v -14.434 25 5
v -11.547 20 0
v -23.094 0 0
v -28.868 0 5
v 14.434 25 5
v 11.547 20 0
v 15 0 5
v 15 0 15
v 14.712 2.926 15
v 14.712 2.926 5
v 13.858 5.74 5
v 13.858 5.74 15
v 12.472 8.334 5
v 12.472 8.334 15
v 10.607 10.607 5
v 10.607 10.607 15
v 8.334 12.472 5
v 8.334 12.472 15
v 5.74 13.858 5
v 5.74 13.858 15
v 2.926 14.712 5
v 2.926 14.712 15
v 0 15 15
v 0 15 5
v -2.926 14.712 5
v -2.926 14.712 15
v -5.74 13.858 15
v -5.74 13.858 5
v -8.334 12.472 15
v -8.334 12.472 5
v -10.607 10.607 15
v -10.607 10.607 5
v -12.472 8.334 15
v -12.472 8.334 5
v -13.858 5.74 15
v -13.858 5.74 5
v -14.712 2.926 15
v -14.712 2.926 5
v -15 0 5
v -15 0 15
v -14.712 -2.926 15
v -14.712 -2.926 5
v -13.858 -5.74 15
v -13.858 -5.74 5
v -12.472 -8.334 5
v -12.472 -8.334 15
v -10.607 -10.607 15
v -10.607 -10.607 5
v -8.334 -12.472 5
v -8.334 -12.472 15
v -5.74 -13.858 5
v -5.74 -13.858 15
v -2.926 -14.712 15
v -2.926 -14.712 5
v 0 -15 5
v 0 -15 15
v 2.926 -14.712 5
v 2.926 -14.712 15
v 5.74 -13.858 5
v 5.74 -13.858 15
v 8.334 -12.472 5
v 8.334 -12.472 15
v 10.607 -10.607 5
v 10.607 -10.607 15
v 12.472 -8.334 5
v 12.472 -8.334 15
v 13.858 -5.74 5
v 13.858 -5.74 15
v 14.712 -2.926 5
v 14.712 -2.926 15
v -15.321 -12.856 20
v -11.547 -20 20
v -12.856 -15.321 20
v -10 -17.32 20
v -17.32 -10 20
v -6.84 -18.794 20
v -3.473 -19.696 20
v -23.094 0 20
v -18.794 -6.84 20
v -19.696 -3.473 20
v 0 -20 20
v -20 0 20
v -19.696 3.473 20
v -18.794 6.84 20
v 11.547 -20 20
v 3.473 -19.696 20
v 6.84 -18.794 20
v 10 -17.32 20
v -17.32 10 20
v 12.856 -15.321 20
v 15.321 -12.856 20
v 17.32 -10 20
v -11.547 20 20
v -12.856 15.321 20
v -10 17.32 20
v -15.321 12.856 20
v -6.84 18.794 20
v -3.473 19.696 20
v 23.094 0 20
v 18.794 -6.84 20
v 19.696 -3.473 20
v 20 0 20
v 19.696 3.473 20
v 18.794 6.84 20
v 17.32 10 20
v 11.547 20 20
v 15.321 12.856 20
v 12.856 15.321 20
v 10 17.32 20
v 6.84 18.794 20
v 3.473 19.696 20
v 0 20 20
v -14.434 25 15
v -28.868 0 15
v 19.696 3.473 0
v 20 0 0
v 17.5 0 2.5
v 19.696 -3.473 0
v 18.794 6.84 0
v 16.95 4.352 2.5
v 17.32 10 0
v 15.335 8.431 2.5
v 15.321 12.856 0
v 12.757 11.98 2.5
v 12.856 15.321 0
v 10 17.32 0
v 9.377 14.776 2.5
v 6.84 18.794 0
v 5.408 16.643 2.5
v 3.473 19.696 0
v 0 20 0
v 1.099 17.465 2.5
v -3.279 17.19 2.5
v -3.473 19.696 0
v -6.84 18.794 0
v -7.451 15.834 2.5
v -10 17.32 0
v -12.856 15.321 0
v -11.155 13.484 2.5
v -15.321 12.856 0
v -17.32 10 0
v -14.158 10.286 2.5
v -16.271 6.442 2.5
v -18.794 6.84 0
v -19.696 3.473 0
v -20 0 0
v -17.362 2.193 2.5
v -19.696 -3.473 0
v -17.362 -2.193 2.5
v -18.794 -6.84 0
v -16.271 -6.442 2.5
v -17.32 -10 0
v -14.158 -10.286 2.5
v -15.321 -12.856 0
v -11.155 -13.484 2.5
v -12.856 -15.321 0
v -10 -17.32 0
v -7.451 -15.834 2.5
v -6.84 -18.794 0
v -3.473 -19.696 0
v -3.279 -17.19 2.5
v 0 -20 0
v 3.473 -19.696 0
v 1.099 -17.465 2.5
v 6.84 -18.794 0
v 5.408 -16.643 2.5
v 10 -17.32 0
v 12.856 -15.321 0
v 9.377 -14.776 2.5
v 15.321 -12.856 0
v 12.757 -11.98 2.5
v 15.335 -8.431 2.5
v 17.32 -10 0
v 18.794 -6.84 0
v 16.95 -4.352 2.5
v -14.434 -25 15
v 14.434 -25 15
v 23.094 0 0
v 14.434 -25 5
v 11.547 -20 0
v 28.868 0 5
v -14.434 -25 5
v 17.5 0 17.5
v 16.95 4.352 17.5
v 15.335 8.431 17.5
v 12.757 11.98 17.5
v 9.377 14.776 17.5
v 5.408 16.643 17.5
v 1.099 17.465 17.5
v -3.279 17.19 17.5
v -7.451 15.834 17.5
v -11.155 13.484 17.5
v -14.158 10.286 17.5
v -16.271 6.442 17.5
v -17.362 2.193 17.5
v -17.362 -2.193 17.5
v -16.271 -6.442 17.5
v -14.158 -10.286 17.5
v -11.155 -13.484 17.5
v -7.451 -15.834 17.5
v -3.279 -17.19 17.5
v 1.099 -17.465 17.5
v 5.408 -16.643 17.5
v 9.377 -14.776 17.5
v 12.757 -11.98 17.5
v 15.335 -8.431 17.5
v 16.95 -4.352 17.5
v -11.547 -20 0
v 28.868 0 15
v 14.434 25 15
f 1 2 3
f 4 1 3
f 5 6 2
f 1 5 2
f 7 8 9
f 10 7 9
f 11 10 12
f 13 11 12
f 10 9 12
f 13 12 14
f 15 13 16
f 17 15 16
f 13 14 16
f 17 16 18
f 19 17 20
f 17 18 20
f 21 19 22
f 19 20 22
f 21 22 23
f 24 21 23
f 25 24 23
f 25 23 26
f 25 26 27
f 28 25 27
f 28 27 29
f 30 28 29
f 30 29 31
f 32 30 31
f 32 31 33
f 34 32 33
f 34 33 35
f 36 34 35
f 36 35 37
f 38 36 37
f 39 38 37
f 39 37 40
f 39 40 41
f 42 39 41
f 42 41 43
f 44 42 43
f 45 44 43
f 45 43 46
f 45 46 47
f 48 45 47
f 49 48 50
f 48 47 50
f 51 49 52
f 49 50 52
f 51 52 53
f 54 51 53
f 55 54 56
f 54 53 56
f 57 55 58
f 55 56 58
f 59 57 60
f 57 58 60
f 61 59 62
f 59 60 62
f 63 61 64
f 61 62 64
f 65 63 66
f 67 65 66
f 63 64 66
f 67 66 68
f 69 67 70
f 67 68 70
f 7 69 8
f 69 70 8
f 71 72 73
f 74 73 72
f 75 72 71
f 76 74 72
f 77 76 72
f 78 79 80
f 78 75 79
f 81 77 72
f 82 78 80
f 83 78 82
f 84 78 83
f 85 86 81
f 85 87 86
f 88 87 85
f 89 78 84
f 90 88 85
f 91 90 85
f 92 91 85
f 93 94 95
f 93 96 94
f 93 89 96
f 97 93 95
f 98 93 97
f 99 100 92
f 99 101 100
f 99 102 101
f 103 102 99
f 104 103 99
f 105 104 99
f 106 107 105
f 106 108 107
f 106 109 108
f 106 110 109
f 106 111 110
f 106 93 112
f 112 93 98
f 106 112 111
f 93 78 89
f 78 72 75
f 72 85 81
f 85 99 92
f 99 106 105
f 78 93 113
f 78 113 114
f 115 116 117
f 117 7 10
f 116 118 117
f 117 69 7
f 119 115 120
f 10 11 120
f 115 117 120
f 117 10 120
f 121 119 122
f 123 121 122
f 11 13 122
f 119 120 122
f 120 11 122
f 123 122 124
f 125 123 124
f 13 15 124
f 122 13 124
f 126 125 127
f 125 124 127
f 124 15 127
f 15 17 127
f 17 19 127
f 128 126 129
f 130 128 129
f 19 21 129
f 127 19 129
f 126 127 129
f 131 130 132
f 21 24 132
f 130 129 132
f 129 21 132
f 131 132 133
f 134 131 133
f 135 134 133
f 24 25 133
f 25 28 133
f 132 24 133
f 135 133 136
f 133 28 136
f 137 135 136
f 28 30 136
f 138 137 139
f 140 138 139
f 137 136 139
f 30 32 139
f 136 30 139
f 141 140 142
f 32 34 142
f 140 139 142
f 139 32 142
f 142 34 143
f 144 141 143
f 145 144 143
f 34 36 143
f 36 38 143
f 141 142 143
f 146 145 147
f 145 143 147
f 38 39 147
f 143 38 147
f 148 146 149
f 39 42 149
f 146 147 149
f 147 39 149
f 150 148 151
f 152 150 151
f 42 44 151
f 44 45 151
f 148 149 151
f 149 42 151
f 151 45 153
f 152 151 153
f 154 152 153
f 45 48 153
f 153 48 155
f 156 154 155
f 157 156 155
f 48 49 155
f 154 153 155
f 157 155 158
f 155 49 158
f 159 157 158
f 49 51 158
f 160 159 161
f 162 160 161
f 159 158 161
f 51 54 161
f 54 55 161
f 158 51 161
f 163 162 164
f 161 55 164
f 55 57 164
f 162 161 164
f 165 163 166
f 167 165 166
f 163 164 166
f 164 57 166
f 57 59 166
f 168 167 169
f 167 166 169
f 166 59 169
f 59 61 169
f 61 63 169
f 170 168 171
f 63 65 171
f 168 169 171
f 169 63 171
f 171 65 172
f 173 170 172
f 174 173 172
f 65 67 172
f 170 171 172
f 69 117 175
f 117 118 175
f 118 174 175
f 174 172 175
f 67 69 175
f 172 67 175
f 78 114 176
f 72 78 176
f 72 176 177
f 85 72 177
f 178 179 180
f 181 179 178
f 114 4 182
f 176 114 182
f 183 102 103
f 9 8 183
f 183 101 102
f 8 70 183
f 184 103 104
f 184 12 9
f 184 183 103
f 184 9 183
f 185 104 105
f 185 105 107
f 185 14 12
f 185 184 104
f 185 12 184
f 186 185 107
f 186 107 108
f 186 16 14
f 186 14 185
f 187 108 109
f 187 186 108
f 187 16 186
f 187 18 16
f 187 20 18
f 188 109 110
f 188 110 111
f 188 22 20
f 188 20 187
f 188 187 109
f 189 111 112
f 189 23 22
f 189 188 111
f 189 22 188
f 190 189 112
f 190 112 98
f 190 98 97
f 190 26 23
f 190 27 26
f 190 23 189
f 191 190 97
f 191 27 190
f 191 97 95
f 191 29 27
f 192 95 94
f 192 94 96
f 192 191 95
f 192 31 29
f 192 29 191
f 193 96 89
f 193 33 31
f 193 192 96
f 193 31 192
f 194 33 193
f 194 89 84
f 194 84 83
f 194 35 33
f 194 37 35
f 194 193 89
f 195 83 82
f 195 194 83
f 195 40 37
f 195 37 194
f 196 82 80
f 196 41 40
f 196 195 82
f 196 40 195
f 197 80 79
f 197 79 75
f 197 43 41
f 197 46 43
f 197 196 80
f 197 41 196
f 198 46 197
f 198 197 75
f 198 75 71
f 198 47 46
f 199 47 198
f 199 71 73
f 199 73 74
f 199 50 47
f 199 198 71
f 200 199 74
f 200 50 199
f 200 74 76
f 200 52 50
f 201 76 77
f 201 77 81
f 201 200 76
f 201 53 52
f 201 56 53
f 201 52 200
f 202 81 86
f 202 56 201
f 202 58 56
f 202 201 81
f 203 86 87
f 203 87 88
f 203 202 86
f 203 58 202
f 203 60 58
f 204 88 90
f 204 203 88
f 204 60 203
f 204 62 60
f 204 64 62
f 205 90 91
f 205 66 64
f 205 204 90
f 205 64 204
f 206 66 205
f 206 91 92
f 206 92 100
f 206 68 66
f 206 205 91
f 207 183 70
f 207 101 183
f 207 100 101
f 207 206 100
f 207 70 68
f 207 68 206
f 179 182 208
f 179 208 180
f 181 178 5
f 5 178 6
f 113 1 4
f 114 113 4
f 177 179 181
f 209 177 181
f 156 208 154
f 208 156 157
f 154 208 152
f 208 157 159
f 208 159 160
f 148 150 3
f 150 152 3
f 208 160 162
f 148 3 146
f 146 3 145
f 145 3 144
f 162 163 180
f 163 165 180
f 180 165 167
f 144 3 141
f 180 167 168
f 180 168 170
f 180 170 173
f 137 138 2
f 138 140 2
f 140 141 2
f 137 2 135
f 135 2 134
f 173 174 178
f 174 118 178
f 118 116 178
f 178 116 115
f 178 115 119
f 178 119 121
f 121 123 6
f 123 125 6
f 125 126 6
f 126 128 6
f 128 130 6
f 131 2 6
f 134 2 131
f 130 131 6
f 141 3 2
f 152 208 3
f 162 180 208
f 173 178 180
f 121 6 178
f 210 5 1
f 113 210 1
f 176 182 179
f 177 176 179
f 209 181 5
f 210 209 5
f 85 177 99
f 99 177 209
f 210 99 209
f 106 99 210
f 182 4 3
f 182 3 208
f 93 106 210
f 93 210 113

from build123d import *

# Parameters (mm, degrees)
F1_DEPTH = 20
F2_R     = 15
F3_DEPTH = 25
F4_SIZE  = 4.99999


# Not quite as in the source:
# - a fillet or chamfer is up to 0.001 mm smaller than in the source, because OpenCascade refuses the exact size


with BuildPart() as f1:
    # F0 (on Top) → F1 (new body)
    with BuildSketch(Plane.XY):
        Polygon((14.4337567297, 25), (-14.4337567297, 25), (-28.8675134595, 0), (-14.4337567297, -25), (14.4337567297, -25), (28.8675134595, 0), align=None)
    extrude(amount=F1_DEPTH)

    # F2 (on face) → F3 (cut)
    with BuildSketch(Plane.XY.offset(20)):
        Circle(F2_R)
    extrude(amount=-F3_DEPTH, mode=Mode.SUBTRACT)

    # F4 (size 5 in the source; OpenCascade refuses exactly that, so slightly less here)
    f4_edges = [f1.edges().sort_by_distance(p)[0] for p in [
        (0, 25, 20),
        (21.650635, 12.5, 20),
        (-21.650635, 12.5, 20),
        (21.650635, -12.5, 20),
        (-21.650635, -12.5, 20),
        (0, -25, 20),
        (-15, 0, 20),
        (0, 25, 0),
        (21.650635, 12.5, 0),
        (-21.650635, 12.5, 0),
        (21.650635, -12.5, 0),
        (-21.650635, -12.5, 0),
        (0, -25, 0),
        (-15, 0, 0),
    ]]
    chamfer(f4_edges, length=F4_SIZE)


solid = f1.part
